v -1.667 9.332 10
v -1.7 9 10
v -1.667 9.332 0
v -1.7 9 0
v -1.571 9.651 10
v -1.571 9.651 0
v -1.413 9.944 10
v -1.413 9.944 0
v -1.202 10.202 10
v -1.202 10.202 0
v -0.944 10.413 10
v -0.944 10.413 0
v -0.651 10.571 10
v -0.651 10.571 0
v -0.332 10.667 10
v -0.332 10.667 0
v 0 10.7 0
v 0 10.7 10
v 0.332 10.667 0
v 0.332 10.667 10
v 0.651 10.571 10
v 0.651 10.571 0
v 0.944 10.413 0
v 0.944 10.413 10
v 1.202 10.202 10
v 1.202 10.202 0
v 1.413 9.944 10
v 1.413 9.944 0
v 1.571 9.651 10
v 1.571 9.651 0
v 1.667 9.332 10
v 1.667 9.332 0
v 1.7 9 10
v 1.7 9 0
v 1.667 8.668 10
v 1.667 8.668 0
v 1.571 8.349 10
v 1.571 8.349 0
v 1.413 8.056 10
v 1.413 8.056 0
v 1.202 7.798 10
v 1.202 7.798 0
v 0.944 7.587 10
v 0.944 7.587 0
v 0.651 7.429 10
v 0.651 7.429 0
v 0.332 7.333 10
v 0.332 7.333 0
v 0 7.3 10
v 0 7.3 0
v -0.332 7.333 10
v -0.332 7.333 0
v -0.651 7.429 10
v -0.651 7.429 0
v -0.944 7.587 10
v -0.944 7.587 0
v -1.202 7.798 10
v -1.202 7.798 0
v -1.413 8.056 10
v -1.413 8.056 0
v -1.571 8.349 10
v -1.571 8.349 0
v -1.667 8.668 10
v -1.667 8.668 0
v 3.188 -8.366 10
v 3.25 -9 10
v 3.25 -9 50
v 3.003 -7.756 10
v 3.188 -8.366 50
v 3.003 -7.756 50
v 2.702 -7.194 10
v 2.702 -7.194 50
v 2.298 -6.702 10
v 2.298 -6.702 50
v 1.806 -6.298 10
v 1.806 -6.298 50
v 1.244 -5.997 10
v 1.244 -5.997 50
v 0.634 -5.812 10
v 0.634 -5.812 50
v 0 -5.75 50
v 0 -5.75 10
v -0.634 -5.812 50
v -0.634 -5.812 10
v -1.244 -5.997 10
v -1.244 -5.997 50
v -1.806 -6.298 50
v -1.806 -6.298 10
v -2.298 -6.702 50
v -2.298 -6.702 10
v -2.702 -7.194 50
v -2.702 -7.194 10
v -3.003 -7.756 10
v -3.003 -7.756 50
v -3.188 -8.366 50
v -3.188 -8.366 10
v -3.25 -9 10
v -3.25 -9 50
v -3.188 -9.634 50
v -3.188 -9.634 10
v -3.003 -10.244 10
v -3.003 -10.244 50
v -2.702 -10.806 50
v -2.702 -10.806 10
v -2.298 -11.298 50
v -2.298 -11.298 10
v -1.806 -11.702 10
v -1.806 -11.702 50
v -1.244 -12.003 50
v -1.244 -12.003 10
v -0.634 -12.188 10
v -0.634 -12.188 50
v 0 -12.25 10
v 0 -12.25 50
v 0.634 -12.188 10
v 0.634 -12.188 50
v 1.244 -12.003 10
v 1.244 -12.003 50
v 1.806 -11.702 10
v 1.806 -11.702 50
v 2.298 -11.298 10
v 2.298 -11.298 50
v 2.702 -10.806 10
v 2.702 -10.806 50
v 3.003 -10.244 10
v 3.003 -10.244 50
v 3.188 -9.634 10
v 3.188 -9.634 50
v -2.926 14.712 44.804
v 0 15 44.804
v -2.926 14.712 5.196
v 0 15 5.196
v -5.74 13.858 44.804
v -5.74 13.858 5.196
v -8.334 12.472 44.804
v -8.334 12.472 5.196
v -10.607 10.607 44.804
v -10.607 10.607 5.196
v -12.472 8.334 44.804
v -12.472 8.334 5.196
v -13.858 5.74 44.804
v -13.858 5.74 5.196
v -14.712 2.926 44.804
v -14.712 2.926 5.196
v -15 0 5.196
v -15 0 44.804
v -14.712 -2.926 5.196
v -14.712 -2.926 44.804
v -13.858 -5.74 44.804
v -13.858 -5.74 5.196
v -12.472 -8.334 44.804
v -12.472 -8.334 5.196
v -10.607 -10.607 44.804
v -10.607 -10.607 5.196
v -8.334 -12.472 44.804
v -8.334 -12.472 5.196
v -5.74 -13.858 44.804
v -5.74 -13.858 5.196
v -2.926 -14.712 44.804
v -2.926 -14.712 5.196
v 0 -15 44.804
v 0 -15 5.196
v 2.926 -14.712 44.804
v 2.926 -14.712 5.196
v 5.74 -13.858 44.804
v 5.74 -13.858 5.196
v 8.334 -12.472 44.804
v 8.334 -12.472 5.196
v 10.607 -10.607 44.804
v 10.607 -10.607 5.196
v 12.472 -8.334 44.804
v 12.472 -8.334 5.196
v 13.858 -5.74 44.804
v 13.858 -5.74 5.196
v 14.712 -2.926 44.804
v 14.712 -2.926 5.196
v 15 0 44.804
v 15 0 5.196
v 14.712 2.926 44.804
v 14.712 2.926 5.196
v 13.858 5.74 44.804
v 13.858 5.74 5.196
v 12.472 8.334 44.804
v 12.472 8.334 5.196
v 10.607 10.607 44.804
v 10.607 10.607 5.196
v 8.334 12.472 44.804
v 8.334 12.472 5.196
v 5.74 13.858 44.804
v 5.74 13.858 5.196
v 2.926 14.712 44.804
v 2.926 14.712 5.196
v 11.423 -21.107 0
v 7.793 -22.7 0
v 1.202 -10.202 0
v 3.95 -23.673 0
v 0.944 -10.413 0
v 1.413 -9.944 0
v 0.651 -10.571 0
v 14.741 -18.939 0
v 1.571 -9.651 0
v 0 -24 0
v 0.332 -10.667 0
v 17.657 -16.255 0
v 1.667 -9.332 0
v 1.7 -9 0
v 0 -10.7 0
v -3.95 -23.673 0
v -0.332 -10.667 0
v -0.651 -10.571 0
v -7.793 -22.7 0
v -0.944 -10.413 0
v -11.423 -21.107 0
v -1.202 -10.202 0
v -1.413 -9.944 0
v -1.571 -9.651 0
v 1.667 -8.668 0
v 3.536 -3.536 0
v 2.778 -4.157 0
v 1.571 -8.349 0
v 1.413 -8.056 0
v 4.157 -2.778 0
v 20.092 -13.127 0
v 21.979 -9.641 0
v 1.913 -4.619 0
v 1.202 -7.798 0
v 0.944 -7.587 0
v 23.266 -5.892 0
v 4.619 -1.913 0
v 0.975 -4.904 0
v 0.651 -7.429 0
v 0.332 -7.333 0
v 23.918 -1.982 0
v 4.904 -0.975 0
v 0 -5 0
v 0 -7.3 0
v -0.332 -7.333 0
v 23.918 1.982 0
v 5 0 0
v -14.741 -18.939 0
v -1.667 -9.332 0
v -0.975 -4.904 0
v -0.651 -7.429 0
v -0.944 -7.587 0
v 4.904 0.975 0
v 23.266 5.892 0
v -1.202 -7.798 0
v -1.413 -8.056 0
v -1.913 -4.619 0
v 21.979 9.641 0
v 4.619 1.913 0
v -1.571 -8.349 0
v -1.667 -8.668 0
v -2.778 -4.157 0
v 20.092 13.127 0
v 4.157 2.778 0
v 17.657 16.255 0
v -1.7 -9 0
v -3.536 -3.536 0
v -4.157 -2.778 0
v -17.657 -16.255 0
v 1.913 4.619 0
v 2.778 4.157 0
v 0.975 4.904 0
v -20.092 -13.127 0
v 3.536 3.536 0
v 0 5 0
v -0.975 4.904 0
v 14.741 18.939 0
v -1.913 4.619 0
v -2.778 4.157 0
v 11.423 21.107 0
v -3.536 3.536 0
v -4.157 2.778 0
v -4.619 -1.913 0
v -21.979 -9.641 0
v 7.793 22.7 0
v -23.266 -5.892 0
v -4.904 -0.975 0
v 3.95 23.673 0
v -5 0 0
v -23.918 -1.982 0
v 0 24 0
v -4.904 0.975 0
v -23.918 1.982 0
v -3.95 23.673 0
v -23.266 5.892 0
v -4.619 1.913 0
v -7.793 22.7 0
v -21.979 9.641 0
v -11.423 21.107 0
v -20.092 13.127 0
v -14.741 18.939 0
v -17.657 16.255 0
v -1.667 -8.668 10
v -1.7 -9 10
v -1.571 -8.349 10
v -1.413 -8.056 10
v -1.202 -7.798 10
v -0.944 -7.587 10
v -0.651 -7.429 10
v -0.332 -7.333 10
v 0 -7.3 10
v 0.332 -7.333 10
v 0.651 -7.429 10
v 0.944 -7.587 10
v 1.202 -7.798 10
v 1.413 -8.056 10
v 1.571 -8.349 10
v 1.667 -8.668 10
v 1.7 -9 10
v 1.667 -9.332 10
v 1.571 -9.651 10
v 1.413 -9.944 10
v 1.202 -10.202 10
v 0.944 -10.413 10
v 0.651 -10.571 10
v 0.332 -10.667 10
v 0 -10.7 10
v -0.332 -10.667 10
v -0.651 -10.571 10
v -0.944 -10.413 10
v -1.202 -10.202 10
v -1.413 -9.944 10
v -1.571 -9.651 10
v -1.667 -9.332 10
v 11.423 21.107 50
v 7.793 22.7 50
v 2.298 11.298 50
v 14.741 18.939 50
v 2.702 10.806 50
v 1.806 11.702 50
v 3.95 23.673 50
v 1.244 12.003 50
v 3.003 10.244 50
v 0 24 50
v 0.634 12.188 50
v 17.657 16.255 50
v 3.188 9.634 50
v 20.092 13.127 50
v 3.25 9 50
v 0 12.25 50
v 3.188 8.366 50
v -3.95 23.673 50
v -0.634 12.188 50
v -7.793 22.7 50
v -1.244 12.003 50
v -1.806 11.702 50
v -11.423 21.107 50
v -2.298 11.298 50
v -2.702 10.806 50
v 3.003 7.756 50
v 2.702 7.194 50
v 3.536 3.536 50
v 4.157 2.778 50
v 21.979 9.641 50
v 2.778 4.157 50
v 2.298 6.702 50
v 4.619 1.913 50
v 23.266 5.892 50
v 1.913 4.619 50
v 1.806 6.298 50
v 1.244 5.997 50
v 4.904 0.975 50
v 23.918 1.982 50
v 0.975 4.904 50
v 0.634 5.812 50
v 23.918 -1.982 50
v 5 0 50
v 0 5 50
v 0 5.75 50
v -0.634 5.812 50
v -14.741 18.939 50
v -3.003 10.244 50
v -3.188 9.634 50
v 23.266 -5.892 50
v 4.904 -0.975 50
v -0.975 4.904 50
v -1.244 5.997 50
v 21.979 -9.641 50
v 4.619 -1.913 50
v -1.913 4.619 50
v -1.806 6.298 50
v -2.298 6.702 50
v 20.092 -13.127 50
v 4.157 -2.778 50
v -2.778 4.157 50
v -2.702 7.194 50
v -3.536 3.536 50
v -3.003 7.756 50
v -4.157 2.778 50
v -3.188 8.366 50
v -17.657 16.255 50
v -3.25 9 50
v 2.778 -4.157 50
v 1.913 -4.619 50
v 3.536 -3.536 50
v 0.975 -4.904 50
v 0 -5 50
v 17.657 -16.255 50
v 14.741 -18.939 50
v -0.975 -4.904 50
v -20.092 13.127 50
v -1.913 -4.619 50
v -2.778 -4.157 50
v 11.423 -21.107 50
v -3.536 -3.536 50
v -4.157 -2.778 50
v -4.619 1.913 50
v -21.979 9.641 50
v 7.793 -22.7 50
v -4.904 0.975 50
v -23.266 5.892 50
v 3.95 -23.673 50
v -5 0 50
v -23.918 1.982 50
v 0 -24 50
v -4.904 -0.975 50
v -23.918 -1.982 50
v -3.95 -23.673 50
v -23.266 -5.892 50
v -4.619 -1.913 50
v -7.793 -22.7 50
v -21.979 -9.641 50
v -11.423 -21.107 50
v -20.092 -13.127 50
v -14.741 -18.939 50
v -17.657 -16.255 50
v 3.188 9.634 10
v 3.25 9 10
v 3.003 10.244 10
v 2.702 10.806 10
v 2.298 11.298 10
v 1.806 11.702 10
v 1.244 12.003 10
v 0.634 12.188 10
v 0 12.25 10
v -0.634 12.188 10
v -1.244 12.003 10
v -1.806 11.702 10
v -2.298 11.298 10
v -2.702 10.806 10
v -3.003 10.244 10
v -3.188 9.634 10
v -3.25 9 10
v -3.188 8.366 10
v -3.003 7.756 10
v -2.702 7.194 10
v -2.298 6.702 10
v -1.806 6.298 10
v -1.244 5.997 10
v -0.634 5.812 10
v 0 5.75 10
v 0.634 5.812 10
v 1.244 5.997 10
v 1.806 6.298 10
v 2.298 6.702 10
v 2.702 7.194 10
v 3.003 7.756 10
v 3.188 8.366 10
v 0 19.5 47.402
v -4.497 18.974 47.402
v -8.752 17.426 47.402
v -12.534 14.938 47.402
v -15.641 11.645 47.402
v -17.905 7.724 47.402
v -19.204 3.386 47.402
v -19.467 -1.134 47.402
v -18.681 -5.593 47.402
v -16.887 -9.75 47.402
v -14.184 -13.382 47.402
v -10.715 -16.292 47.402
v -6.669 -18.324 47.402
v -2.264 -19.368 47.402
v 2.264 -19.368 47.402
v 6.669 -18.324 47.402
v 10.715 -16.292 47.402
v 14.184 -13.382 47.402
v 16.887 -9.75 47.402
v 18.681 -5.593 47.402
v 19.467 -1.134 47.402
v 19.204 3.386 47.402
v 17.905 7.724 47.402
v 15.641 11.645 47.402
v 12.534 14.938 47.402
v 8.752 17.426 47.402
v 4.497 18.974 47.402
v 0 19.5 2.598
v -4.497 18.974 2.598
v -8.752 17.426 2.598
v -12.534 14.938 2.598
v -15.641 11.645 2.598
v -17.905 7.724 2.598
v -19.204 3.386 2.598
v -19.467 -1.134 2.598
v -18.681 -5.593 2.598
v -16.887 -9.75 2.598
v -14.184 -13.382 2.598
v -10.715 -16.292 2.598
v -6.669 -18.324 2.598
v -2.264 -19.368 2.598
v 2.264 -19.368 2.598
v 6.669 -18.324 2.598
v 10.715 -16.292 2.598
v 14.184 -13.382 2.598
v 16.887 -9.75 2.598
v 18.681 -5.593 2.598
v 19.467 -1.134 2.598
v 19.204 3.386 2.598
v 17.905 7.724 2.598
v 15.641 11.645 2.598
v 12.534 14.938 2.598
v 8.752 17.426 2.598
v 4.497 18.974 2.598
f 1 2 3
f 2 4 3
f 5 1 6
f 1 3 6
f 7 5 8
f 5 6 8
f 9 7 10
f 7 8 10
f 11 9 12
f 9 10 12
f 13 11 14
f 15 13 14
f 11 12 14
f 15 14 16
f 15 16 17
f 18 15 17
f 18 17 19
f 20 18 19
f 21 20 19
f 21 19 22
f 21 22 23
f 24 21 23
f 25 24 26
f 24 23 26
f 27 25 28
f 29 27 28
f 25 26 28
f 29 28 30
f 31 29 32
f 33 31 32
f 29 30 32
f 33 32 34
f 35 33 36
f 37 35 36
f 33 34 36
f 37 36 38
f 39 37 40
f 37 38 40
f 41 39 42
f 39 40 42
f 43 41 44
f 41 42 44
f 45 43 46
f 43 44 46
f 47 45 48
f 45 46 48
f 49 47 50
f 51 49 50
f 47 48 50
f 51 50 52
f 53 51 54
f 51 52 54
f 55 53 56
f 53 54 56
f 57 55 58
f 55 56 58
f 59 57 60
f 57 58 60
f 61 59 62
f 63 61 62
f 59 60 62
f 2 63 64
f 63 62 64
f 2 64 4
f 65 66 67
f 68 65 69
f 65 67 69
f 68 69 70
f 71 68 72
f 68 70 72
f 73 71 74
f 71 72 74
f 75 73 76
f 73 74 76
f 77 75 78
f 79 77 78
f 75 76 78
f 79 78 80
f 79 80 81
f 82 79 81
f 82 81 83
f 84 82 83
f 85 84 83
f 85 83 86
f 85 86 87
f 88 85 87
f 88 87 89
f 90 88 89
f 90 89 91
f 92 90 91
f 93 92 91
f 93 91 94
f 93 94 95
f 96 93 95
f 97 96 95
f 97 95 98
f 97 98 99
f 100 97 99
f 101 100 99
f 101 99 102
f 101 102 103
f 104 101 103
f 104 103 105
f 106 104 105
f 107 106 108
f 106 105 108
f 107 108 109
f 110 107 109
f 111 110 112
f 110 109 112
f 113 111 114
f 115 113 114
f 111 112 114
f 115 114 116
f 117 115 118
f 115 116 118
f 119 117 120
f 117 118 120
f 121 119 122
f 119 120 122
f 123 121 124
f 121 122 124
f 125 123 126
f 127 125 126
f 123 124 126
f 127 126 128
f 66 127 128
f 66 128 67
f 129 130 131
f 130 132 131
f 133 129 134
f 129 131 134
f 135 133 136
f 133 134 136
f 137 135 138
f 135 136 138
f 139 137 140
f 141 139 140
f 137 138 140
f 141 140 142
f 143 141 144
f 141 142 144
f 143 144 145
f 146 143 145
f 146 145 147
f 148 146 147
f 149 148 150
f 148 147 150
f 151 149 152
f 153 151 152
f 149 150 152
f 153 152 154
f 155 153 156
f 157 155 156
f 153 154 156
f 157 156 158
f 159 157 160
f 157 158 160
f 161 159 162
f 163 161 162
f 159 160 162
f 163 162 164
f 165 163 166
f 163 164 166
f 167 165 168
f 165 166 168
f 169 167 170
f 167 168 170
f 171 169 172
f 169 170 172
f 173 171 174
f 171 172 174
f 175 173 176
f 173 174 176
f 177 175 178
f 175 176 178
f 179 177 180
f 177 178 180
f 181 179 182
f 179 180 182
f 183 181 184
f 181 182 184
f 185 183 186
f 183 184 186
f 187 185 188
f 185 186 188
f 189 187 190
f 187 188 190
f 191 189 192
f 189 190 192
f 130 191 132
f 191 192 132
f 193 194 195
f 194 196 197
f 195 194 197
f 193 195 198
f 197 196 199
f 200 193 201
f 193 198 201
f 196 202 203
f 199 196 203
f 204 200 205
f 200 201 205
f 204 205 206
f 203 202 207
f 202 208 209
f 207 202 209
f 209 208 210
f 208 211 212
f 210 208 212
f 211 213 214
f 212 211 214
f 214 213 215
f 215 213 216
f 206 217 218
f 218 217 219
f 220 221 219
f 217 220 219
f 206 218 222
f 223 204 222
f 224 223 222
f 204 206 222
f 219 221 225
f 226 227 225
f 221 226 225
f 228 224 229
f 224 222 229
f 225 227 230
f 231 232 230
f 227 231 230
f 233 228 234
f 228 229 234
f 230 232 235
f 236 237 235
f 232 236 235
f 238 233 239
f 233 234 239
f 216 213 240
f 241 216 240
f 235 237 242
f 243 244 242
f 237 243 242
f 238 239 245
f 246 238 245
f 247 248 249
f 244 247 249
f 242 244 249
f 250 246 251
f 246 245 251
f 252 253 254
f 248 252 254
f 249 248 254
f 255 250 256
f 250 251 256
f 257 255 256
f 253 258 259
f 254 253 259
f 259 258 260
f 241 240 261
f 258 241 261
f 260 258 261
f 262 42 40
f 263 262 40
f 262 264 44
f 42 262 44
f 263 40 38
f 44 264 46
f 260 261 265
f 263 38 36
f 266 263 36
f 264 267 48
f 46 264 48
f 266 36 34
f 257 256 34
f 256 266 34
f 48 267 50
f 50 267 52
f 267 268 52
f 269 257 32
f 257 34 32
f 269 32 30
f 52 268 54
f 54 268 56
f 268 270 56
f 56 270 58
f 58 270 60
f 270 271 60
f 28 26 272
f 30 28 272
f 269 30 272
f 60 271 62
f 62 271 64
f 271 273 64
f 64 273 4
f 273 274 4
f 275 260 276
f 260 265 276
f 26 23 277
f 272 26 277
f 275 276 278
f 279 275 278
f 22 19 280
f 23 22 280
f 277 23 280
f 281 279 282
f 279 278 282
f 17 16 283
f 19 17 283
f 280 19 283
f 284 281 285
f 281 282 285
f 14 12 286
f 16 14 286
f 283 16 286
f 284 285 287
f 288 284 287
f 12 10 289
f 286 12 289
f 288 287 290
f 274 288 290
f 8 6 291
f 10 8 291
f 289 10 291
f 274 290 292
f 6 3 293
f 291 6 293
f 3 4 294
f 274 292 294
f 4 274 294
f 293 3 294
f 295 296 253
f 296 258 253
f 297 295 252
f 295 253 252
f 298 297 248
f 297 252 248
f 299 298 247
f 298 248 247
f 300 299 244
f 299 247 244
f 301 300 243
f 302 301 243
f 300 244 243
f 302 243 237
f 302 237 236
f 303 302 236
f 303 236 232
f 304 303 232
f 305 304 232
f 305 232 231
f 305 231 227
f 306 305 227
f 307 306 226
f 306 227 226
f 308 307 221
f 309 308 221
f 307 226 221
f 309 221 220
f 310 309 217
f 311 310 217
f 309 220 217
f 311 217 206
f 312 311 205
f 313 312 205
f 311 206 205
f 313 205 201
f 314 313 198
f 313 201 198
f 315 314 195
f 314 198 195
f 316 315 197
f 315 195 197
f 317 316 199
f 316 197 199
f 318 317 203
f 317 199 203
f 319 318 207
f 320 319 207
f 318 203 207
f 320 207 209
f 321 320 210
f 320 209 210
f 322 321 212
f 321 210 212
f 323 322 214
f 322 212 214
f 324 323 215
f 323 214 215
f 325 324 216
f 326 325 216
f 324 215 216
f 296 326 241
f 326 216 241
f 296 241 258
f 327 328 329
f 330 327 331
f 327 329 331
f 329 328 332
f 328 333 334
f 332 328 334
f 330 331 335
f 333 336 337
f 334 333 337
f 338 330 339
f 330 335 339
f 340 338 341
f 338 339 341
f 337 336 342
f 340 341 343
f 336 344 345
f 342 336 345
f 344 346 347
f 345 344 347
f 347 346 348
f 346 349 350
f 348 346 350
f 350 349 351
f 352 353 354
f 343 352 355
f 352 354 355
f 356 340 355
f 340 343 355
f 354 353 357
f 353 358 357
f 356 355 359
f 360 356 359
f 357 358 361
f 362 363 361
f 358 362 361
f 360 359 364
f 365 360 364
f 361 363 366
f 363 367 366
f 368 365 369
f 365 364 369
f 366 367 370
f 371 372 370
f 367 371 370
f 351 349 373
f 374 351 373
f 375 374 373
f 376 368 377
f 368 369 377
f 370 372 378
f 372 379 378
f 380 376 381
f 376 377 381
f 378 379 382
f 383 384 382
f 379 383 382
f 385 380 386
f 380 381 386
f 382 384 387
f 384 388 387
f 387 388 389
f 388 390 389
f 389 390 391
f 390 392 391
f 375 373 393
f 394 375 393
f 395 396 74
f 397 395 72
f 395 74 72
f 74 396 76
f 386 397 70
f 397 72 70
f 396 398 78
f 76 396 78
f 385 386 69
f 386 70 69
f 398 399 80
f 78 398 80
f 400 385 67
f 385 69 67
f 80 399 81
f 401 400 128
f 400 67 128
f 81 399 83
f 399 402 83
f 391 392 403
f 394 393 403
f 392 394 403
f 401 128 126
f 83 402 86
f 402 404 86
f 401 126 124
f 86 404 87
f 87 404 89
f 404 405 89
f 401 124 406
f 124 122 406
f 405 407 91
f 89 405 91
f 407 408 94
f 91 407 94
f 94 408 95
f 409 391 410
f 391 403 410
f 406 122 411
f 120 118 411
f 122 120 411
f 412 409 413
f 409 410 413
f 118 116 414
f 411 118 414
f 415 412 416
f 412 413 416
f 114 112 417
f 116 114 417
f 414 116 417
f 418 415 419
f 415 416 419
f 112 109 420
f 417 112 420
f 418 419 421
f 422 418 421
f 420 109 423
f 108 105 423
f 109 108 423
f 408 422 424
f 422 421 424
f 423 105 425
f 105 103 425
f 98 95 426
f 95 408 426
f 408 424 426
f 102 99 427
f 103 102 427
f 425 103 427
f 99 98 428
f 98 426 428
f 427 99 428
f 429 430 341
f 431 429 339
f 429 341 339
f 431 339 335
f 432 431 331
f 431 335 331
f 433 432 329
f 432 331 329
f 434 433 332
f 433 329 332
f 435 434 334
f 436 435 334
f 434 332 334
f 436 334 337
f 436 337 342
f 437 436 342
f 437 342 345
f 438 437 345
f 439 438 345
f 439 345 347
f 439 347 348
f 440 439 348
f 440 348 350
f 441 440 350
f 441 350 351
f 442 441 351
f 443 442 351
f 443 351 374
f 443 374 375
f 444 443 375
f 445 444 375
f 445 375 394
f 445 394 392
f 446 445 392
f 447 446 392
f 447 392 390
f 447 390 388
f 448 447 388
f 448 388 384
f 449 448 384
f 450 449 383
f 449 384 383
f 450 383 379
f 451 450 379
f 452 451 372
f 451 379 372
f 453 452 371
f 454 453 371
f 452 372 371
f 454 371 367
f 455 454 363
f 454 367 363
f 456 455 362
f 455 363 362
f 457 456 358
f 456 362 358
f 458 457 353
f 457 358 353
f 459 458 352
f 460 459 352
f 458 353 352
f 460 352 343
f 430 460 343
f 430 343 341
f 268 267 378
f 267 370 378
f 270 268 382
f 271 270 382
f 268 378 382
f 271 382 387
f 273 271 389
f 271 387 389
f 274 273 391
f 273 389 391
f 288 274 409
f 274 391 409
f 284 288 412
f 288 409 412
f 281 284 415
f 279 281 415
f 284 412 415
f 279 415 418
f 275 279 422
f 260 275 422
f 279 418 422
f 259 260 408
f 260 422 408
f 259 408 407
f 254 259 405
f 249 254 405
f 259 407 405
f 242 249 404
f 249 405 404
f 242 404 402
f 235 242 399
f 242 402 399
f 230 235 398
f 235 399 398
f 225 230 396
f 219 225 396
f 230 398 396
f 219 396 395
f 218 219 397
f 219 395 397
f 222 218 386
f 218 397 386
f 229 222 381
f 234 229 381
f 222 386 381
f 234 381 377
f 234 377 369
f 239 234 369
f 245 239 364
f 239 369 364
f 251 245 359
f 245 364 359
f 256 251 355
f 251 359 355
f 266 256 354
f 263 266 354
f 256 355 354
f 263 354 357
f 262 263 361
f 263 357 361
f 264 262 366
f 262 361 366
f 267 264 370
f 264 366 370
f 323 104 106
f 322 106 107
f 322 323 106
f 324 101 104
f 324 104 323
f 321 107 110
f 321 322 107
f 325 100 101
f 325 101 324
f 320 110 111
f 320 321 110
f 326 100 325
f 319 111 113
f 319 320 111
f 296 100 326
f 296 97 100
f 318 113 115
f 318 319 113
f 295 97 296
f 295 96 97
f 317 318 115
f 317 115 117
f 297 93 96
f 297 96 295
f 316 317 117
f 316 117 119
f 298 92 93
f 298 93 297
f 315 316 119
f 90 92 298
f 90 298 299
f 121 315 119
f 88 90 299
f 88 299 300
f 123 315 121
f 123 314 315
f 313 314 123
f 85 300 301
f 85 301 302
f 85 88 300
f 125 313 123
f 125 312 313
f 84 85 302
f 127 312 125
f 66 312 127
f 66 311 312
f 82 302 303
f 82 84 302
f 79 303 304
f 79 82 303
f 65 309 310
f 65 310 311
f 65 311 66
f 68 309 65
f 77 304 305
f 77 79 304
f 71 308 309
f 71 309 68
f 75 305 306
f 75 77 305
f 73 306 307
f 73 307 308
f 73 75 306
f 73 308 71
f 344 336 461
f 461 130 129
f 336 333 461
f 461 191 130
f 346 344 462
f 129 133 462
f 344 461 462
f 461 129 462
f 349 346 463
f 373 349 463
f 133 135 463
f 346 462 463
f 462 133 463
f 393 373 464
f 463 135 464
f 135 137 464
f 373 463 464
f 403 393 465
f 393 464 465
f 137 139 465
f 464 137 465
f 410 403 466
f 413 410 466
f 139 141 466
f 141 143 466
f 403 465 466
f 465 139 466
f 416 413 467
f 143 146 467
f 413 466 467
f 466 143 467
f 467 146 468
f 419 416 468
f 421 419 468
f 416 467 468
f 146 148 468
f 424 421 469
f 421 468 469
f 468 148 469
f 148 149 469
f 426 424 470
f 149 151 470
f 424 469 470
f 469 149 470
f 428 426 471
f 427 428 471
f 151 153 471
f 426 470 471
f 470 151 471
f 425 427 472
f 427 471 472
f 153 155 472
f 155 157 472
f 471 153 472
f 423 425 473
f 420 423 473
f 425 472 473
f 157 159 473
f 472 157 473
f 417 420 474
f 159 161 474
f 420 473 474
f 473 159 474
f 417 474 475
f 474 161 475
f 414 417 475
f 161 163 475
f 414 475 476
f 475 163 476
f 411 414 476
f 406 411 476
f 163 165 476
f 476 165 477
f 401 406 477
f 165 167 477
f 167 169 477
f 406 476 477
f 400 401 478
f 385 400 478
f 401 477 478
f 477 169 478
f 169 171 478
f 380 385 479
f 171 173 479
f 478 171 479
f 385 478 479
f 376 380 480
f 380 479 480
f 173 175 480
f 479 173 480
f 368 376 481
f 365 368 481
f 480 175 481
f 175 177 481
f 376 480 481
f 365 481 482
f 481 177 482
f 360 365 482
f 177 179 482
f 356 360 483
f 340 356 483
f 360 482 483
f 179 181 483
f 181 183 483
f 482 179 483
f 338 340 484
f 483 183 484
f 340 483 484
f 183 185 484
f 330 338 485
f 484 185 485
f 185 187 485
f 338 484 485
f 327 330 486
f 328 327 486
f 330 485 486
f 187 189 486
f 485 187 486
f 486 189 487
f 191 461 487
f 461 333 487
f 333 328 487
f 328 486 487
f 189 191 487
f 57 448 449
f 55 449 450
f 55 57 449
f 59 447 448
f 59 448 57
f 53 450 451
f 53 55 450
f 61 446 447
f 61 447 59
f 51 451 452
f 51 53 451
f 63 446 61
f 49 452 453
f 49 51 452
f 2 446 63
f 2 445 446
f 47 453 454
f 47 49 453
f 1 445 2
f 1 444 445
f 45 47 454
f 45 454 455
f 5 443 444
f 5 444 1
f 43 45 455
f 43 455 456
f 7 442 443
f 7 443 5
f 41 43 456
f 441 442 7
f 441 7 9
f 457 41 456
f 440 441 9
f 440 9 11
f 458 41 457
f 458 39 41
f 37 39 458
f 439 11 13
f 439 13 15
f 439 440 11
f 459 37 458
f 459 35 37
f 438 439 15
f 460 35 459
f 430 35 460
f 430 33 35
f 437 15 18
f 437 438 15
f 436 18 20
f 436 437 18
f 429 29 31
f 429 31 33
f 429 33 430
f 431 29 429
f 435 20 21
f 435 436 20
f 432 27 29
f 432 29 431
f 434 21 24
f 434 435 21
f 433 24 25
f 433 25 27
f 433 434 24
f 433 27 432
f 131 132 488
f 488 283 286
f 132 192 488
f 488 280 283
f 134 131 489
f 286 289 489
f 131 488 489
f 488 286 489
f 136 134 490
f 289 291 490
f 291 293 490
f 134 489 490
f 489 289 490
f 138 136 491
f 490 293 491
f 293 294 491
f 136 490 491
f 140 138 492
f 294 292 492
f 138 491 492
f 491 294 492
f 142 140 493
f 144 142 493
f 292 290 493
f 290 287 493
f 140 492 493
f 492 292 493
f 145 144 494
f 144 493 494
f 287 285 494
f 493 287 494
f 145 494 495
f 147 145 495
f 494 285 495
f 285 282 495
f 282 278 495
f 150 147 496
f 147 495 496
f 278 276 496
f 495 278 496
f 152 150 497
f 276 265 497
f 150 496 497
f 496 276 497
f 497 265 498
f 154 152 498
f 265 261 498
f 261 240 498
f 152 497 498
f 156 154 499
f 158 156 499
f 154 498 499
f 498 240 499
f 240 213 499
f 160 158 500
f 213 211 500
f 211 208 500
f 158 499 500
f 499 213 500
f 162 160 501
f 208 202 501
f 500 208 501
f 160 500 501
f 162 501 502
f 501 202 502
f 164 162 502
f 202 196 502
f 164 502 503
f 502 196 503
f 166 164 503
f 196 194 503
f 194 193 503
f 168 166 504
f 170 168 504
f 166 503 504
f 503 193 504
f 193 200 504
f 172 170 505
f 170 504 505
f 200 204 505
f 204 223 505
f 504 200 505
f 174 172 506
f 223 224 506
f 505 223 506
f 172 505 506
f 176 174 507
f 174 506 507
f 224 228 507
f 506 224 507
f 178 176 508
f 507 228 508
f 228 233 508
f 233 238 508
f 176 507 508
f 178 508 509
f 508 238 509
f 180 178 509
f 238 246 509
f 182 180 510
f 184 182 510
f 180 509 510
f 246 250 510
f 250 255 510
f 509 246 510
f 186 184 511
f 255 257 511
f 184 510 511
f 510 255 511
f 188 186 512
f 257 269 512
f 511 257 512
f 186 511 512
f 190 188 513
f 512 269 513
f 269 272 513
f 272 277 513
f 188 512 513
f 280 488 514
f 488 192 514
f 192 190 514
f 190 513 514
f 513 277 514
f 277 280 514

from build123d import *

# Parameters (mm, degrees)
CBORE_FOR_M3_SHCS1_D           = 3.4
CBORE_FOR_M3_SHCS1_CBORE_D     = 6.5
CBORE_FOR_M3_SHCS1_CBORE_DEPTH = 40


with BuildPart() as part:
    # Sketch2 → Revolve1 (revolve)
    with BuildSketch(Plane(origin=(0, 0, 0), x_dir=(-1, 0, 0), z_dir=(0, -1, 0)), mode=Mode.PRIVATE) as revolve1_sk:
        Polygon((5, 0), (5, -50), (24, -50), (15, -44.803847577), (15, -5.196152423), (24, 0), align=None)
    revolve(revolve1_sk.sketch.rotate(Axis((0, 0, 0), (0, 0, 1)), 270), axis=Axis((0, 0, 0), (0, 0, 1)))

    # CBORE for M3 SHCS1 (through all)
    with Locations(Plane.XY.offset(50)):
        with Locations((0, -9), (0, 9)):
            CounterBoreHole(CBORE_FOR_M3_SHCS1_D / 2, CBORE_FOR_M3_SHCS1_CBORE_D / 2, CBORE_FOR_M3_SHCS1_CBORE_DEPTH)


solid = part.part
